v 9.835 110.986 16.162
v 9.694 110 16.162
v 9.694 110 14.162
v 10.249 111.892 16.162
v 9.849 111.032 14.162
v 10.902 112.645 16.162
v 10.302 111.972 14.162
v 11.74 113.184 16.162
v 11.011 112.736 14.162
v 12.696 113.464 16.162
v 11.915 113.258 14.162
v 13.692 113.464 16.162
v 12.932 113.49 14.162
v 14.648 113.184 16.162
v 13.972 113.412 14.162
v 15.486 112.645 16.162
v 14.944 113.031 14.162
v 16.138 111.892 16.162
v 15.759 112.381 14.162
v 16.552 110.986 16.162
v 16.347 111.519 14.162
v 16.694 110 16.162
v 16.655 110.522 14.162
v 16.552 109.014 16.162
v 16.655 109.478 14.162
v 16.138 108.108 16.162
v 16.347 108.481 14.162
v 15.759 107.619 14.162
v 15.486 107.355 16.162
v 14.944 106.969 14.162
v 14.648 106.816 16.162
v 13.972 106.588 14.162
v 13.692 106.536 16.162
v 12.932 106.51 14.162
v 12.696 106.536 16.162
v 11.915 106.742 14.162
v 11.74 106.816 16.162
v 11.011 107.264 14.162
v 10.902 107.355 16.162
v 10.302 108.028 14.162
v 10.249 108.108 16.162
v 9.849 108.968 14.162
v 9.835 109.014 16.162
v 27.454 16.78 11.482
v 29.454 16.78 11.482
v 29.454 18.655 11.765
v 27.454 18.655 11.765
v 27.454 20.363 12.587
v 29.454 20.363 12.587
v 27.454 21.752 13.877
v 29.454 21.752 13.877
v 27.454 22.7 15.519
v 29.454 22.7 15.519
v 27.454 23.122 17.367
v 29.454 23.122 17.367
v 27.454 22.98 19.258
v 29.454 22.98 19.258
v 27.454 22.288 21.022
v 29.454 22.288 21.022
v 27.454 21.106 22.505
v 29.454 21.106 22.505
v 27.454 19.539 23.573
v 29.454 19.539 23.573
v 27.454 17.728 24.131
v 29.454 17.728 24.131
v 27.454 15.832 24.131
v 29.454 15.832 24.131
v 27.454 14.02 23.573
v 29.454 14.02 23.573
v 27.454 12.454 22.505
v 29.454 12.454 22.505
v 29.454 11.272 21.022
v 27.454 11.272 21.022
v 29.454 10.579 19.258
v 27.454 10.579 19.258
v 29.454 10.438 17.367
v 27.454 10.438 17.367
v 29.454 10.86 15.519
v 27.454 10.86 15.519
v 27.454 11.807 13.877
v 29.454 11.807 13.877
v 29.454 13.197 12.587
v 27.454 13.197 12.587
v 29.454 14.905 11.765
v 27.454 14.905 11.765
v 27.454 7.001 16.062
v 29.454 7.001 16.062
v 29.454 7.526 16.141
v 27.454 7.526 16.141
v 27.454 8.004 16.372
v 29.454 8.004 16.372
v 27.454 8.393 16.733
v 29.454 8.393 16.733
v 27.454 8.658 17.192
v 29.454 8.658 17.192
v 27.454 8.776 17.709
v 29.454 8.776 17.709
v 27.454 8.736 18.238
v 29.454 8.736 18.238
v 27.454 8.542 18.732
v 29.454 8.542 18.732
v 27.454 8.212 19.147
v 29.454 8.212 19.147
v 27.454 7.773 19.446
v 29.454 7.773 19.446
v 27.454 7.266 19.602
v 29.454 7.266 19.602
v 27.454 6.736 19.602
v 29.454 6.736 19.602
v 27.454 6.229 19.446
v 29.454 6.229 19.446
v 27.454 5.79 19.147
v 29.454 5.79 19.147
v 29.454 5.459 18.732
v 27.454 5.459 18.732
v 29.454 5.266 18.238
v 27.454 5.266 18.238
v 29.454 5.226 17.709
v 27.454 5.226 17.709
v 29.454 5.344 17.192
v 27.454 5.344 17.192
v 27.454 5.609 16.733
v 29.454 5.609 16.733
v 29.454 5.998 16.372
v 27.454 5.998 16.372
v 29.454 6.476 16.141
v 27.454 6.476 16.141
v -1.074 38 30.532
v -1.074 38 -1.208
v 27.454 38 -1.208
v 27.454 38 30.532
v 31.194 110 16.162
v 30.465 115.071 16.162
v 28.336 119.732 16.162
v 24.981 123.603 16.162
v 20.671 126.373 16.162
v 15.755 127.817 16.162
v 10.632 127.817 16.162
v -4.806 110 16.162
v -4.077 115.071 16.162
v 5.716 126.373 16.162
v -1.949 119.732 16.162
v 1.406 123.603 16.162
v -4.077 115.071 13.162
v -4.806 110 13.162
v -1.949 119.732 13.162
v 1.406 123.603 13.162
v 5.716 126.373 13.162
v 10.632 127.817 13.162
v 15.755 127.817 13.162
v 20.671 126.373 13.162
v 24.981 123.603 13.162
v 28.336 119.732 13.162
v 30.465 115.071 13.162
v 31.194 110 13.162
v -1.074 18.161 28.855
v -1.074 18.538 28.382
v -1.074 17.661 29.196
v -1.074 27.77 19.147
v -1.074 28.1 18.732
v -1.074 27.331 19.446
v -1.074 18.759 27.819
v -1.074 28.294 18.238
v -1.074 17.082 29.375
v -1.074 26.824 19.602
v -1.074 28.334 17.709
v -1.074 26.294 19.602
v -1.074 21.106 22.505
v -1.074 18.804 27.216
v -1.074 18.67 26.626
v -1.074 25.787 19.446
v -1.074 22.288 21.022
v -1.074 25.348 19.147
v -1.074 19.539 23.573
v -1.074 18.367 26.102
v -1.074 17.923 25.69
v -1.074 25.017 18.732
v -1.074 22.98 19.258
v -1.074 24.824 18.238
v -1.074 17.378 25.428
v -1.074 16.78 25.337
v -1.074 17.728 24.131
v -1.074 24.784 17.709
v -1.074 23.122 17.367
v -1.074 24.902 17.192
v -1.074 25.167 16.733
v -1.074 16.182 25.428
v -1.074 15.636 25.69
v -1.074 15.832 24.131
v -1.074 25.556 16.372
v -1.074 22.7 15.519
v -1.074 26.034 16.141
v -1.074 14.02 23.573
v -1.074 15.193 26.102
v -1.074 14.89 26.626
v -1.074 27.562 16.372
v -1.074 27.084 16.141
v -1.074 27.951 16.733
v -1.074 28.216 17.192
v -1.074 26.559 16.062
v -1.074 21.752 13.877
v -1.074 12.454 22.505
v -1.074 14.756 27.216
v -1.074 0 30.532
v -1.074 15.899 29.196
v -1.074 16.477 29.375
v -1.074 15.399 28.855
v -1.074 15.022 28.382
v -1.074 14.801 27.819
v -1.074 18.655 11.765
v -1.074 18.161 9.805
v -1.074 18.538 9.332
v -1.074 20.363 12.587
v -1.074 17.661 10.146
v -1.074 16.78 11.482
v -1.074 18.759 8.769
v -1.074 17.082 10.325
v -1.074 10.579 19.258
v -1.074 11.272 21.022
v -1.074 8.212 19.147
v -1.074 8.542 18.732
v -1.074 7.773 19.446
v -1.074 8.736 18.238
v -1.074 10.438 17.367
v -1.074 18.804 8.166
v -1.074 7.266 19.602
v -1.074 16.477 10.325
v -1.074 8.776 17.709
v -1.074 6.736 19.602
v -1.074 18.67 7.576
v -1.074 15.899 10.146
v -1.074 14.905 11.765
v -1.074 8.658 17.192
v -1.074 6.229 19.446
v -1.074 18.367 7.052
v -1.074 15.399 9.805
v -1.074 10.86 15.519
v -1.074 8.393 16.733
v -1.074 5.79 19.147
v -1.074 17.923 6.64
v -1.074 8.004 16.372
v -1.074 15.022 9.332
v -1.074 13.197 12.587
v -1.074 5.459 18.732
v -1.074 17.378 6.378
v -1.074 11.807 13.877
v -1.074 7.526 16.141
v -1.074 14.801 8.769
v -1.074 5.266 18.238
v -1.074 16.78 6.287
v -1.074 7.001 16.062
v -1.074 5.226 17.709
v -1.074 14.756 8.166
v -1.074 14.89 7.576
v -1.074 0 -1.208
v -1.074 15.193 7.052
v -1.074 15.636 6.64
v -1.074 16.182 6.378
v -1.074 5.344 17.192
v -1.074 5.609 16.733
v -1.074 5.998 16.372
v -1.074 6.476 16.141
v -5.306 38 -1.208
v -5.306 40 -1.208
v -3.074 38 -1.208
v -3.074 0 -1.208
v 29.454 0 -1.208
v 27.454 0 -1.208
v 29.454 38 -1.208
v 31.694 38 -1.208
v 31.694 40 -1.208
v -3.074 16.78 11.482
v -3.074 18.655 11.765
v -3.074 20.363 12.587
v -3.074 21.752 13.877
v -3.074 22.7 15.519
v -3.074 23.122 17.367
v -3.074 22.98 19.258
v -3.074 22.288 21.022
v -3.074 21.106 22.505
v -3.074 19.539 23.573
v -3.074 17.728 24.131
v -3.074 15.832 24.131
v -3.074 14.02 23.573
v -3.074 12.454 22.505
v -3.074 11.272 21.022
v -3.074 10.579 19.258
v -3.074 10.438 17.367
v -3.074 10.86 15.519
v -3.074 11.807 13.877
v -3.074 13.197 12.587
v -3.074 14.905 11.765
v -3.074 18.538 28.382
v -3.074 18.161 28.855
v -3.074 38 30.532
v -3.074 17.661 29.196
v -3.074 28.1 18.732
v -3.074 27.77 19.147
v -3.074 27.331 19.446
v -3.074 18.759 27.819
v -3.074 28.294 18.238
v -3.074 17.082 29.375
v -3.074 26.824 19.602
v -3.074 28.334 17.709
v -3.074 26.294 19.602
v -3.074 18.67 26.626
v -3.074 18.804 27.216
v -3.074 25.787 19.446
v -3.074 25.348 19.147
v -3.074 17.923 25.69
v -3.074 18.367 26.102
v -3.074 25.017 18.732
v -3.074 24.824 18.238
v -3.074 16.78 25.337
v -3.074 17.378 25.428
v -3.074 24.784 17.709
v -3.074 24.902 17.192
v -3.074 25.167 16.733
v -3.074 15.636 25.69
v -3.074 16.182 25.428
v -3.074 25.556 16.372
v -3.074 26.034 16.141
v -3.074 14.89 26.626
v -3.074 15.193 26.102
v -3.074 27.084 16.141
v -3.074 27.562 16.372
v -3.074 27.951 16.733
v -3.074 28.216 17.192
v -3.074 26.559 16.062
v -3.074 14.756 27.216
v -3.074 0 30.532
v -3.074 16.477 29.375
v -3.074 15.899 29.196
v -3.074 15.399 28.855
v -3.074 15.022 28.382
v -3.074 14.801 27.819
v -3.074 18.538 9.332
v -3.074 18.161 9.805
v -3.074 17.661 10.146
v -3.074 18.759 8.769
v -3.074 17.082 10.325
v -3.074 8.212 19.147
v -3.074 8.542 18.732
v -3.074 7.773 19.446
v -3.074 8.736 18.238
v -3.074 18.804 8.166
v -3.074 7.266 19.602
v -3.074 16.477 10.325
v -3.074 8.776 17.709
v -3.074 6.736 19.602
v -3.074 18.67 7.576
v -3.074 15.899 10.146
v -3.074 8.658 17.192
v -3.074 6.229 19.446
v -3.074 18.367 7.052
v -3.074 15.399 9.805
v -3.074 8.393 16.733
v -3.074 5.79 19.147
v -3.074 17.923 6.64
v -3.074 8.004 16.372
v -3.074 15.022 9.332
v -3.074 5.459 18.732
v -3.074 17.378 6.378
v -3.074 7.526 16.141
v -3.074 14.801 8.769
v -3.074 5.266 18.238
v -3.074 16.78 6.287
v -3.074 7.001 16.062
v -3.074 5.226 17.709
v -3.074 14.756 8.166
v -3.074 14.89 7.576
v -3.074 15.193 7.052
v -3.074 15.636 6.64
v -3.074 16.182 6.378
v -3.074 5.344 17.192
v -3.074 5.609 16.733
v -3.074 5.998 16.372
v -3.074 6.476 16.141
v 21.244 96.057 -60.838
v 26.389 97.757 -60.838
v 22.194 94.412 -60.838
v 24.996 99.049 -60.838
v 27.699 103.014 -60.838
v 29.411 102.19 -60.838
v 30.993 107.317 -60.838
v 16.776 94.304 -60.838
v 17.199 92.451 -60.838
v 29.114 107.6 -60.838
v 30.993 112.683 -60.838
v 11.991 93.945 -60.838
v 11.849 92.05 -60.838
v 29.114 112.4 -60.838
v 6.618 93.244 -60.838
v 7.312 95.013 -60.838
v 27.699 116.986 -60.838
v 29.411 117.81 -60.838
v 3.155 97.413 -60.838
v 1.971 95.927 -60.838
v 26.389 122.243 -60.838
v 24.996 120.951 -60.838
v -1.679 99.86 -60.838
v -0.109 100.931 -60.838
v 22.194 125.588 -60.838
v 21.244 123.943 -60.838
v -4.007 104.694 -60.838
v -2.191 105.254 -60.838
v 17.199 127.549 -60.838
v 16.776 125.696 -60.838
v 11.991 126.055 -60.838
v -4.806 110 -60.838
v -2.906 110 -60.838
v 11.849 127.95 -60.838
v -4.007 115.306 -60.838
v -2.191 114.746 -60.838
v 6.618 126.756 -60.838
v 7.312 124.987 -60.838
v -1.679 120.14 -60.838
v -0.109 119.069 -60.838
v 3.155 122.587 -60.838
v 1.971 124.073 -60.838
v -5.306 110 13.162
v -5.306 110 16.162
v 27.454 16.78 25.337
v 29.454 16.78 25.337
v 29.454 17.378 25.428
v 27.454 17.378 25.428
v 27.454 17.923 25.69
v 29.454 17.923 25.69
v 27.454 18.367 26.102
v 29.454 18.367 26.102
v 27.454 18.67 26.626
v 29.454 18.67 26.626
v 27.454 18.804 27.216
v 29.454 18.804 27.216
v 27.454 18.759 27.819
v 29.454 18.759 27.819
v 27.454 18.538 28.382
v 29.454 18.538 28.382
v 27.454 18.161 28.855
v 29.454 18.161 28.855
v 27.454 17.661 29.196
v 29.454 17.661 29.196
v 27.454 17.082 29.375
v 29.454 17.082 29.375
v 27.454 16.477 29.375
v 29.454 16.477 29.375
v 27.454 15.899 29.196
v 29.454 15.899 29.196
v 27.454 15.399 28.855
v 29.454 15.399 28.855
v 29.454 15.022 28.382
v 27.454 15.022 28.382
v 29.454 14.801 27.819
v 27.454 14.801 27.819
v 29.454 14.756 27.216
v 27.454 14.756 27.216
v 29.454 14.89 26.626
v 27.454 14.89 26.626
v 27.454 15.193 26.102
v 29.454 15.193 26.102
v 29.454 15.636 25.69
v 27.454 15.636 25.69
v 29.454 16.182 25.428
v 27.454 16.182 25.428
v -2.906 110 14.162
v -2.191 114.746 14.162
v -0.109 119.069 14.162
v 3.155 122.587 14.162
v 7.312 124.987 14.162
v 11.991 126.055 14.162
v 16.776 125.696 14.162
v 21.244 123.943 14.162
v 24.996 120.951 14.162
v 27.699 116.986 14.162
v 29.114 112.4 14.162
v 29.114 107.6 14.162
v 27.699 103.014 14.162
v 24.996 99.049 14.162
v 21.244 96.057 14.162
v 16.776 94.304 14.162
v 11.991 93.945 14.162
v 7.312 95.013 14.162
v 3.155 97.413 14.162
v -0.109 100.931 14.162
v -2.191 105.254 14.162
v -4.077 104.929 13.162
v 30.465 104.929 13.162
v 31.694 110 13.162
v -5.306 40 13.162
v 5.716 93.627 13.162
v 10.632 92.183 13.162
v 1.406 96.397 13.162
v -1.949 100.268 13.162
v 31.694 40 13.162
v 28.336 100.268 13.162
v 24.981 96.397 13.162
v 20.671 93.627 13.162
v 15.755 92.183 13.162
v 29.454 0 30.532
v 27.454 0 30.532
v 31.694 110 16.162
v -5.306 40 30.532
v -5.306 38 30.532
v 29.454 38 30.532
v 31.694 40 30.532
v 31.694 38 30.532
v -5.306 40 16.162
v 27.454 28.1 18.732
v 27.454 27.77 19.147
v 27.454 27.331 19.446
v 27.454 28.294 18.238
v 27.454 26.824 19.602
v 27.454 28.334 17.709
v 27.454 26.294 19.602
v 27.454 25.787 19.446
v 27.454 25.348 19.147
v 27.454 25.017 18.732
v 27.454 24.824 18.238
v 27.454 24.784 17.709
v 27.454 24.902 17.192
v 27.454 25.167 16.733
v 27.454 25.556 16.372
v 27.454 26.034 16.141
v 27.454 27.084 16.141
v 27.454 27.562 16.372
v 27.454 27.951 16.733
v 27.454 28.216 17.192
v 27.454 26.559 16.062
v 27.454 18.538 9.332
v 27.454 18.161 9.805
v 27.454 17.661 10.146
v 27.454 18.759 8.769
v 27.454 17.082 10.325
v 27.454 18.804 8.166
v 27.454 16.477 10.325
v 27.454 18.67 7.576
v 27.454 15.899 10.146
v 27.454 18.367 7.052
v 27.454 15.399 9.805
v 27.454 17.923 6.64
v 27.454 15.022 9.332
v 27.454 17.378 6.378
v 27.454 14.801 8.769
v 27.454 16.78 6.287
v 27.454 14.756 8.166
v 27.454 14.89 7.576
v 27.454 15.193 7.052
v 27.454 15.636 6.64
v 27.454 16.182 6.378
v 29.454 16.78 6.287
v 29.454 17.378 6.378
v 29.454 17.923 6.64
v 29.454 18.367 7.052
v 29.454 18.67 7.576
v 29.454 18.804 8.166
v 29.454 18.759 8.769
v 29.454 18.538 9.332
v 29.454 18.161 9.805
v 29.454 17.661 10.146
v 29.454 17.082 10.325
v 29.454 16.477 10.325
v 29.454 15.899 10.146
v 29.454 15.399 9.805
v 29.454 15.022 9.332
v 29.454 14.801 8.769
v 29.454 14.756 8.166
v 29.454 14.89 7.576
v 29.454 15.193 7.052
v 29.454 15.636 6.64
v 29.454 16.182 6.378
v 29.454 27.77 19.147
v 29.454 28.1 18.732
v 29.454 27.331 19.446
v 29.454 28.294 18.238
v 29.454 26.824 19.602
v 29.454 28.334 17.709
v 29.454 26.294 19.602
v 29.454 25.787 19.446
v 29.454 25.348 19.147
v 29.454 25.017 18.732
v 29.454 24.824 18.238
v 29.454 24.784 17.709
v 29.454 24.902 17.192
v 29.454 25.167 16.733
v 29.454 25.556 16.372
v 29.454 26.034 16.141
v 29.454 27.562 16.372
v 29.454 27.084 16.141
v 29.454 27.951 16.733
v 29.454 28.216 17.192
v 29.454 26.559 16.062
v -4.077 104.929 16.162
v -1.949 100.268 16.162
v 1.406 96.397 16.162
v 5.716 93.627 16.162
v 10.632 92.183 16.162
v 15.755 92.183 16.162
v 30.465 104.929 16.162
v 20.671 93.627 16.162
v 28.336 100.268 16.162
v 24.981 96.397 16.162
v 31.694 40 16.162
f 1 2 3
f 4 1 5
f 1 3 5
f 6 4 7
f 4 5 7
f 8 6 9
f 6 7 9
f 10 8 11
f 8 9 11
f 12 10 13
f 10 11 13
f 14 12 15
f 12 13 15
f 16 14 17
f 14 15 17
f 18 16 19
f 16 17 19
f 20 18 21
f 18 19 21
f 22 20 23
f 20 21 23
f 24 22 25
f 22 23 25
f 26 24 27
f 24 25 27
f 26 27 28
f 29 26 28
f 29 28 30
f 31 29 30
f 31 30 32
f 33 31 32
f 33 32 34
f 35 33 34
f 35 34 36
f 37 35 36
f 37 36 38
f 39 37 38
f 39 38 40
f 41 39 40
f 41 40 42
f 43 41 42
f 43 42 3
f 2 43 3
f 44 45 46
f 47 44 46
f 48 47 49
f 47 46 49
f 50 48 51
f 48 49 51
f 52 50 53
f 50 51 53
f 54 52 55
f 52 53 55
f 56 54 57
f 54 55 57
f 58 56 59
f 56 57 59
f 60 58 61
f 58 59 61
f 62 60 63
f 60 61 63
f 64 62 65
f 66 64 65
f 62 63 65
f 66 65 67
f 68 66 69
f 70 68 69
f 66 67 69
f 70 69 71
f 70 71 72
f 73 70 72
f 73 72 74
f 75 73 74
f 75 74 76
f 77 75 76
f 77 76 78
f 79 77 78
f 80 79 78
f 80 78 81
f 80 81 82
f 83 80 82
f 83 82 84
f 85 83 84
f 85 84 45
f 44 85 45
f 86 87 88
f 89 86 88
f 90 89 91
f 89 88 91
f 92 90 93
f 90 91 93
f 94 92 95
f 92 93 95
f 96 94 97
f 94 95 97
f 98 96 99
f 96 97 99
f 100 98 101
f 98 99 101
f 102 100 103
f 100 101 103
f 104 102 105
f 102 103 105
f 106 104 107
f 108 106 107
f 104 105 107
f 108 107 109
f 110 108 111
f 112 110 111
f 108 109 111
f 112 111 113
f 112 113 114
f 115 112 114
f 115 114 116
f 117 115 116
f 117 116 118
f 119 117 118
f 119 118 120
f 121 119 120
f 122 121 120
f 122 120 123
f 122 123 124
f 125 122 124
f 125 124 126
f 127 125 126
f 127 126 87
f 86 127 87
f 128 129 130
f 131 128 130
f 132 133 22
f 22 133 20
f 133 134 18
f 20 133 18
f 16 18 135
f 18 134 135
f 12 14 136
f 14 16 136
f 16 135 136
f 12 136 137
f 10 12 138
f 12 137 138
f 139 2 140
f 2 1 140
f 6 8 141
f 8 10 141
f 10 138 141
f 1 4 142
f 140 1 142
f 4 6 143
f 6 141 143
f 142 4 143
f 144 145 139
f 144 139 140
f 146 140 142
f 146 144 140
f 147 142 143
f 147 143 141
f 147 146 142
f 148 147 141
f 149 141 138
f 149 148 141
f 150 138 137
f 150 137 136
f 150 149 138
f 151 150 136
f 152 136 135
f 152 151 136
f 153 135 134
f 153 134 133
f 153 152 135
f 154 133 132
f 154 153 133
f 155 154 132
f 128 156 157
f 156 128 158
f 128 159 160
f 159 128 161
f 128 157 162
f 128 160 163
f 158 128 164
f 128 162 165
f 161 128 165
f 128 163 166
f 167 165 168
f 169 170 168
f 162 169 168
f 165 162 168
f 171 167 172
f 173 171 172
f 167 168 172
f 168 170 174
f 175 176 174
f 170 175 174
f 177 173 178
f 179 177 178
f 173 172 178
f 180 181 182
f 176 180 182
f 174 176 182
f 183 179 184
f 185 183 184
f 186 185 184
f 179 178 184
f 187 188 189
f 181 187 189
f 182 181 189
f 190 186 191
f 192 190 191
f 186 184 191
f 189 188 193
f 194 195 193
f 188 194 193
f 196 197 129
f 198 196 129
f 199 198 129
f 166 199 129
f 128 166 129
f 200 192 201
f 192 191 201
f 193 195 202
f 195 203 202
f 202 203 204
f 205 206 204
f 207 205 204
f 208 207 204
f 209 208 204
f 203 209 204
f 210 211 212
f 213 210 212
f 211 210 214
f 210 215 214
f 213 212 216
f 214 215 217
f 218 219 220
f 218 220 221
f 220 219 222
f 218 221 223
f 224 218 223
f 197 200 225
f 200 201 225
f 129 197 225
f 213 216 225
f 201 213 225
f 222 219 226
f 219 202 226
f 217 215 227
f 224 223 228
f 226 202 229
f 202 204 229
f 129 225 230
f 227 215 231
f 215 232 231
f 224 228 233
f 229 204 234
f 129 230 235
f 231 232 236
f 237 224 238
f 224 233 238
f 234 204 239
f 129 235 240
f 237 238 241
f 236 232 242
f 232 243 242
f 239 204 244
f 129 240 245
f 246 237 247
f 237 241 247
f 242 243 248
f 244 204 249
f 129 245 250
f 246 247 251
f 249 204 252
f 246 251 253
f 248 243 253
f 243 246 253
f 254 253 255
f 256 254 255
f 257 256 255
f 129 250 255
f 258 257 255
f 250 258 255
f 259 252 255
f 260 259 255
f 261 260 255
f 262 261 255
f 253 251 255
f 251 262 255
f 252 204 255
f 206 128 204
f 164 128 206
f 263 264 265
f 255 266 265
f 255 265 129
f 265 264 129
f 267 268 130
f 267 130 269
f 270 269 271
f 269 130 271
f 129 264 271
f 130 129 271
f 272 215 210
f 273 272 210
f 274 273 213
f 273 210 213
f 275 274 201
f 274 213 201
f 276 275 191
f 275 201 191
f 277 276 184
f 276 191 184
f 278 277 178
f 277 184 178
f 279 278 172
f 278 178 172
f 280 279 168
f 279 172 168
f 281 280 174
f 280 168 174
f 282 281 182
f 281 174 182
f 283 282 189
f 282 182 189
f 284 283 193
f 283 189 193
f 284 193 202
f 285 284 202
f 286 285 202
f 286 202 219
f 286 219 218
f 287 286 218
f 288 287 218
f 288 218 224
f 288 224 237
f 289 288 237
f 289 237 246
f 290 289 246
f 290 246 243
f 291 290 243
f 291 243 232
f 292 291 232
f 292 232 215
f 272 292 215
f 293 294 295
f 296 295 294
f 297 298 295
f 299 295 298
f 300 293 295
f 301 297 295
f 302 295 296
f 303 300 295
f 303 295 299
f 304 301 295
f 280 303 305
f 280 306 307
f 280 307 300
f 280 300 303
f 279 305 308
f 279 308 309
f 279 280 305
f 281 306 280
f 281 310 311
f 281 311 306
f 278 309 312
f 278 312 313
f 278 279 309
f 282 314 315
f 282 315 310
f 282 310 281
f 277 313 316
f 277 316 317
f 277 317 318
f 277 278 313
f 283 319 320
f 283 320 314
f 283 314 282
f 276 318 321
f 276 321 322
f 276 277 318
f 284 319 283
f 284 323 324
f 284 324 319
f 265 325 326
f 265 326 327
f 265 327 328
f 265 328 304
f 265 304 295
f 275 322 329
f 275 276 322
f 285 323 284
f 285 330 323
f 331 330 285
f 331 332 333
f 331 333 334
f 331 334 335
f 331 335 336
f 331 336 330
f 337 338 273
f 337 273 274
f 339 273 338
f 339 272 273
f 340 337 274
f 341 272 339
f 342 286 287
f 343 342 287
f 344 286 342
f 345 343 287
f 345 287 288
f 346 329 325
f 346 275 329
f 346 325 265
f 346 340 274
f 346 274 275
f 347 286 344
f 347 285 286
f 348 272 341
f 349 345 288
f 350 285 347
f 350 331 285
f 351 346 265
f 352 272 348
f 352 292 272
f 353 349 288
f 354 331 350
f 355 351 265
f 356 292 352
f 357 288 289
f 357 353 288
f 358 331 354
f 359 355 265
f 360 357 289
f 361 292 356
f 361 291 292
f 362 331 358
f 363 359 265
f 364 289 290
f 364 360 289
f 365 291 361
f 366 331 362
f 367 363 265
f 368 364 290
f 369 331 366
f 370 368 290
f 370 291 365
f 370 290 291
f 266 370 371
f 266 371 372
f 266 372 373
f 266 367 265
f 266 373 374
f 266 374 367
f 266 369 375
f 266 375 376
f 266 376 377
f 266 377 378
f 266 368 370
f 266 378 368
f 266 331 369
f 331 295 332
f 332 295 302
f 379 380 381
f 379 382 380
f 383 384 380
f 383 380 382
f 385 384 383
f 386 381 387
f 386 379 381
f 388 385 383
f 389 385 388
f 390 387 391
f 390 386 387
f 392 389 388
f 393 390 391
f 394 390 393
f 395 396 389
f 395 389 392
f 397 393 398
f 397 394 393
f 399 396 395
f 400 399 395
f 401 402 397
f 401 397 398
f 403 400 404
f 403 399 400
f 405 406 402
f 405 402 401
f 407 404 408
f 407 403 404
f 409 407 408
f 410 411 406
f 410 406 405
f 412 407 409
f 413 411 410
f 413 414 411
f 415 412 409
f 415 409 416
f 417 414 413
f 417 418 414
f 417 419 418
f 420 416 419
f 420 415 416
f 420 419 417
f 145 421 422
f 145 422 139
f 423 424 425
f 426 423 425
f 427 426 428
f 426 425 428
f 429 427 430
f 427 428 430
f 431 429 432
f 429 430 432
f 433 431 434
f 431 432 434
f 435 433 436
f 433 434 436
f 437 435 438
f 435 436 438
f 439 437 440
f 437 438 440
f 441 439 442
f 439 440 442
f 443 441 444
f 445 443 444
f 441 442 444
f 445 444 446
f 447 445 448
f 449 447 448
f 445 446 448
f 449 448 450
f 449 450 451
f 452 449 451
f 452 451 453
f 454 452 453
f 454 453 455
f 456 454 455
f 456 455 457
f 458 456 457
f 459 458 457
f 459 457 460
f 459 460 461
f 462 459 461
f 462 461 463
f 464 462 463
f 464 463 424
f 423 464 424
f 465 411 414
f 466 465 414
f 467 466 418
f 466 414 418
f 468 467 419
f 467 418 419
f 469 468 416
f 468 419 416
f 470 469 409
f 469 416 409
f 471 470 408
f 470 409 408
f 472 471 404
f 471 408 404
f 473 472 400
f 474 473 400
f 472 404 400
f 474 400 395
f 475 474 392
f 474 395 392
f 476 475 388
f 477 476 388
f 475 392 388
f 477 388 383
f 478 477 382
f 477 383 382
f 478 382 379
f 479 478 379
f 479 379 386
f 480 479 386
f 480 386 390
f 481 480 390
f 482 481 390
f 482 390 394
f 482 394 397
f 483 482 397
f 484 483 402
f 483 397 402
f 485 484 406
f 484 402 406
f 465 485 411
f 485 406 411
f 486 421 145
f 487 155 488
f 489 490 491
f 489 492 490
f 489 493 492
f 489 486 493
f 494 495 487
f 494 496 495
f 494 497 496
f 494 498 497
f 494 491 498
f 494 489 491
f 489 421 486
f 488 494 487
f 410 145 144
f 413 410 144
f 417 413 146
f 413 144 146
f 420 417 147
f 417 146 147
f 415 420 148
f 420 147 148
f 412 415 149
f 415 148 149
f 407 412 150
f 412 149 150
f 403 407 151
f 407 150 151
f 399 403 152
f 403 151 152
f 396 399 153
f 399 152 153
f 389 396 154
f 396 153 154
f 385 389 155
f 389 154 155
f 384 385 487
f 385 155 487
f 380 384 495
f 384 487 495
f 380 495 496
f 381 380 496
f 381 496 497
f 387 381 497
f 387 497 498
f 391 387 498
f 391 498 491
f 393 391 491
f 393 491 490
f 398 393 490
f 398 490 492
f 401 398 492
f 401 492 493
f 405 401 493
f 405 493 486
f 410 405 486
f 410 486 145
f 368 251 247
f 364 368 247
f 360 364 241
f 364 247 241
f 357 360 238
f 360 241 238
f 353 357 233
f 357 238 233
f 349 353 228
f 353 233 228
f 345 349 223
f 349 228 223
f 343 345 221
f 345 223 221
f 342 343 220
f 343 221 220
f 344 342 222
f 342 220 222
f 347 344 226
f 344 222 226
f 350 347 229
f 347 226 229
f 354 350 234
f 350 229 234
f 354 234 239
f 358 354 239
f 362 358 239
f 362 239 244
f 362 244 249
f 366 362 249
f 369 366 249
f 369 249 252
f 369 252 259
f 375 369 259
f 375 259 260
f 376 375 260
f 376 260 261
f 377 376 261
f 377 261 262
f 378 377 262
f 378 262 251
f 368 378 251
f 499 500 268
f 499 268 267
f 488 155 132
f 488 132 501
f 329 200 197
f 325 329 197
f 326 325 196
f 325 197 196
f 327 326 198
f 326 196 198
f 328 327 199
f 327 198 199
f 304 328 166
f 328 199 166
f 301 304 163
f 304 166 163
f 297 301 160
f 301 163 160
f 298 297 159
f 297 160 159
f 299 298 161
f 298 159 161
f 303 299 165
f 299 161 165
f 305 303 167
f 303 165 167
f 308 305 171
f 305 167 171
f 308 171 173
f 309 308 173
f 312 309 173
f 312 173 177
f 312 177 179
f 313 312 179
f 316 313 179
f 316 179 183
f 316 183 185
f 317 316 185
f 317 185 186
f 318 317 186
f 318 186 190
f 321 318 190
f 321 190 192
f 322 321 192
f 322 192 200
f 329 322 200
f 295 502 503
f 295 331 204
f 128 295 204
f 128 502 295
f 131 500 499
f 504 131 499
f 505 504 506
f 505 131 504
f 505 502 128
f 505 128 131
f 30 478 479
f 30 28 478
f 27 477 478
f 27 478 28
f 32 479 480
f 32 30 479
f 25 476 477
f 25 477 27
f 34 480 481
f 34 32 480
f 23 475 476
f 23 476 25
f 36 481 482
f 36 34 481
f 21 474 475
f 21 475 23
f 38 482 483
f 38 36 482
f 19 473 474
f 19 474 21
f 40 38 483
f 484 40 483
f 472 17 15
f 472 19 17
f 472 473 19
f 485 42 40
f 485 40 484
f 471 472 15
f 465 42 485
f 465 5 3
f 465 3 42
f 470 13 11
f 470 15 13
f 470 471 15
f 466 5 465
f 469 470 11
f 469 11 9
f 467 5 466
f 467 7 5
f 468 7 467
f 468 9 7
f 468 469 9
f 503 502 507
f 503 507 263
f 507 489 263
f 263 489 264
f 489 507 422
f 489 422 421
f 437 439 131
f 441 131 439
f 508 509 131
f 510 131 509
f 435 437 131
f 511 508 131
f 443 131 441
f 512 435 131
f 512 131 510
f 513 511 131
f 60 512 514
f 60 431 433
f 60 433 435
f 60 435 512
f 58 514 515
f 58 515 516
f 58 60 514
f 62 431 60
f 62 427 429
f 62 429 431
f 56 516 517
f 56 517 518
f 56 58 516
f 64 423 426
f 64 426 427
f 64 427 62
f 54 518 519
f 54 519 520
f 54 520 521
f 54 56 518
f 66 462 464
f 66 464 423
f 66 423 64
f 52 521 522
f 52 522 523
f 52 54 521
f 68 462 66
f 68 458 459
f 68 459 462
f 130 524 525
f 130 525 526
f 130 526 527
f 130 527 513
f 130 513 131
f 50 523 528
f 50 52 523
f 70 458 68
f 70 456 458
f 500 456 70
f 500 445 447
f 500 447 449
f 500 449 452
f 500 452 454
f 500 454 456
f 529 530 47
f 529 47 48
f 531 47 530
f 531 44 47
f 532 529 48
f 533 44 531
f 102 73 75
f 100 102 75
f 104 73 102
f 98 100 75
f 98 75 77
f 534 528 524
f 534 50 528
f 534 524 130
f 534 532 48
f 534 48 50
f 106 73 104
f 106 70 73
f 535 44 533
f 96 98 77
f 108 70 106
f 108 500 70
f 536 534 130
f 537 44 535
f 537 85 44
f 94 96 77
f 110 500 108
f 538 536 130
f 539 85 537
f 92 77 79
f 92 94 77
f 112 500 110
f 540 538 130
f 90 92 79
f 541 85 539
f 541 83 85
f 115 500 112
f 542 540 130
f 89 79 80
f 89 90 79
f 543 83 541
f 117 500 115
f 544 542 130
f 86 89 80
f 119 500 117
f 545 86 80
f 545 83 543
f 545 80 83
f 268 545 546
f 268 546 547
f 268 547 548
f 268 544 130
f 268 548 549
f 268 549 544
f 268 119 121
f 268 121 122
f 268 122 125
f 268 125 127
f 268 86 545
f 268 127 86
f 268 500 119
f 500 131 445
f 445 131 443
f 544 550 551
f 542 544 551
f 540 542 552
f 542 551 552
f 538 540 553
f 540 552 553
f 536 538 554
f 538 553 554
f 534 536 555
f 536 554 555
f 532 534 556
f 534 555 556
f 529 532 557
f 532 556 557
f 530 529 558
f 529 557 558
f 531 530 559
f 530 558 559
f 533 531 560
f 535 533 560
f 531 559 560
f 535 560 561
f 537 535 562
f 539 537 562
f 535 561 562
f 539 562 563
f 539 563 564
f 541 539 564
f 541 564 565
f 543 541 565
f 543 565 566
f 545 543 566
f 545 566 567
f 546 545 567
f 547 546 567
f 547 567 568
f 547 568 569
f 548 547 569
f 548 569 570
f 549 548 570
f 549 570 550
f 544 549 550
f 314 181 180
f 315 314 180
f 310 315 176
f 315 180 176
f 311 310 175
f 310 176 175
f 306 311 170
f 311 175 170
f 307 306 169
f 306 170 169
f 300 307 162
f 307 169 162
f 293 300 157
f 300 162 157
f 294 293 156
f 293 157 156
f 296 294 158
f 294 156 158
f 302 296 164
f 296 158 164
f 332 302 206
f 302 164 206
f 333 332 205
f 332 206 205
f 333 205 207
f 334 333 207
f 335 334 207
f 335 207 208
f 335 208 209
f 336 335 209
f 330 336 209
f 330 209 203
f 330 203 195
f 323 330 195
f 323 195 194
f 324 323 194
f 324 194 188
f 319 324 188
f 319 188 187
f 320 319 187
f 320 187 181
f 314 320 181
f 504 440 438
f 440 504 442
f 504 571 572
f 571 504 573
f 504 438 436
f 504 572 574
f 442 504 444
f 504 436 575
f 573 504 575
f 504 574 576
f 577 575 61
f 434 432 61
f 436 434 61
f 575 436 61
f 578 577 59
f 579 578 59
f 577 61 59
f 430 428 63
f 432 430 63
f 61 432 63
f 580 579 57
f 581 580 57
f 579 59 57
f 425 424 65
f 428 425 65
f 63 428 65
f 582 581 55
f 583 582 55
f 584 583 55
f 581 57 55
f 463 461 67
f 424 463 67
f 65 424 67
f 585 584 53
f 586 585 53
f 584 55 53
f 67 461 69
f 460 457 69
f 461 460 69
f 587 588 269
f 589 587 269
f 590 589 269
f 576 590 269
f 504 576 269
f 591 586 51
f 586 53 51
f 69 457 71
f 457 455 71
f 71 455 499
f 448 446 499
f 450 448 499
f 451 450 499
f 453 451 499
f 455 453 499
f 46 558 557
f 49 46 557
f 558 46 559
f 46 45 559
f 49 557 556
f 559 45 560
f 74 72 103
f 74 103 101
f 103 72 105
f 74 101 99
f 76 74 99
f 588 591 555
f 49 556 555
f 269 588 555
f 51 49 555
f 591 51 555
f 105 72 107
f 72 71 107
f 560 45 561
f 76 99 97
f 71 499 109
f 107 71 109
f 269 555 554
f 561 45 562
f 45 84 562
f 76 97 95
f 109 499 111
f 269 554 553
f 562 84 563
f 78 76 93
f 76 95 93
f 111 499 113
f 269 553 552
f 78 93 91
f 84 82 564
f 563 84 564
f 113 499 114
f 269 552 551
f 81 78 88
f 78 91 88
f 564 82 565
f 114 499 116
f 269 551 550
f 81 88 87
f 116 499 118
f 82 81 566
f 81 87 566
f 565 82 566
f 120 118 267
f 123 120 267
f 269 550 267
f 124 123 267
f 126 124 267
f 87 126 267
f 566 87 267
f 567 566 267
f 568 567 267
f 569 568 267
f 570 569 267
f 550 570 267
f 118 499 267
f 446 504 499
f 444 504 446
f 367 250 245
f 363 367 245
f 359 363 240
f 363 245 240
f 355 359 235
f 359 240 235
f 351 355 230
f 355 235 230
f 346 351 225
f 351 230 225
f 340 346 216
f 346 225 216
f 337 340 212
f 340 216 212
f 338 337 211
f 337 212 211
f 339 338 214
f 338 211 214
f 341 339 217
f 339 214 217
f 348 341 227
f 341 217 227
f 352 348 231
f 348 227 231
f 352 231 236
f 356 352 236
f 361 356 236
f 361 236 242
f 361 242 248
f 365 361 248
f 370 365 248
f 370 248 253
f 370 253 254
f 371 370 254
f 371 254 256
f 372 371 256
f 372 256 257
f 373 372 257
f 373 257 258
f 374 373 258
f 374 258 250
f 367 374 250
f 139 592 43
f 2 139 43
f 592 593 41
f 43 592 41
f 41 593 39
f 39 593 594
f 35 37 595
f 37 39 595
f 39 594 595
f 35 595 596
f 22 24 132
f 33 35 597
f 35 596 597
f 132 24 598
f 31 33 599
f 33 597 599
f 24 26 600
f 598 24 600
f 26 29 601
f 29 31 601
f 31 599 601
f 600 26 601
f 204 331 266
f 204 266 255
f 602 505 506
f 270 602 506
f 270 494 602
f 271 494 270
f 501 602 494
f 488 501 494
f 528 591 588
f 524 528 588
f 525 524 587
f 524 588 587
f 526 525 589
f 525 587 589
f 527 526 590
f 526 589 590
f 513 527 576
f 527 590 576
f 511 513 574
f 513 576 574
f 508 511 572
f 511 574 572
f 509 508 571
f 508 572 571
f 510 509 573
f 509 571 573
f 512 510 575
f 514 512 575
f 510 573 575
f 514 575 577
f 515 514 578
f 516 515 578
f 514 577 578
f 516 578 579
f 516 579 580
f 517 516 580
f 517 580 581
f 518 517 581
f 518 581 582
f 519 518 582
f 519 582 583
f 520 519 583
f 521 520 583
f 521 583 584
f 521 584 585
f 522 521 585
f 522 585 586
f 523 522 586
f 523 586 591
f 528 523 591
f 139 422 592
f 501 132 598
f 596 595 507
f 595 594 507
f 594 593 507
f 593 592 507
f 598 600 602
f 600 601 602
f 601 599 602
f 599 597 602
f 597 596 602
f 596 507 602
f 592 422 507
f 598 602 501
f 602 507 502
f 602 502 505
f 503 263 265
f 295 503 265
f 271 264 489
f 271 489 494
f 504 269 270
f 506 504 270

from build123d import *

# Parameters (mm, degrees)
SKETCH1_W                = 2
SKETCH1_H                = 31.74
BOSS_EXTRUDE1_DEPTH      = 40
BOSS_EXTRUDE1_2_DEPTH    = 40
SKETCH2_W                = 37
SKETCH2_H                = 31.74
BOSS_EXTRUDE3_DEPTH      = 2
SKETCH8_W                = 37
SKETCH8_H                = 3
BOSS_EXTRUDE4_DEPTH      = 70
SKETCH12_R               = 18
BOSS_EXTRUDE6_DEPTH      = 74
BOSS_EXTRUDE6_DEPTH_BACK = 3
SKETCH18_R               = 16.1
CUT_EXTRUDE2_DEPTH       = 75
SKETCH19_R               = 3.5
CUT_EXTRUDE3_DEPTH       = 74
SKETCH20_R               = 6.36
SKETCH20_R_2             = 1.78
SKETCH20_R_3             = 2.03
CUT_EXTRUDE4_DEPTH       = 3.24
CUT_EXTRUDE4_DEPTH_BACK  = 35.76


with BuildPart() as part:
    # Sketch1 → Boss-Extrude1 (new body)
    with BuildSketch(Plane(origin=(0, 0, 0), x_dir=(1, 0, 0), z_dir=(0, 1, 0))):
        with Locations((-2.074327578, -14.662349727)):
            Rectangle(SKETCH1_W, SKETCH1_H)
    extrude(amount=BOSS_EXTRUDE1_DEPTH)



with BuildPart() as body_2:
    # Sketch1 → Boss-Extrude1 2 (new body)
    with BuildSketch(Plane(origin=(0, 0, 0), x_dir=(1, 0, 0), z_dir=(0, 1, 0))):
        with Locations((28.453672422, -14.662349727)):
            Rectangle(SKETCH1_W, SKETCH1_H)
    extrude(amount=BOSS_EXTRUDE1_2_DEPTH)


with BuildPart() as part_1:
    add(part.part)

    add(body_2.part)  # Boss-Extrude3 merges body 2
    # Sketch2 → Boss-Extrude3 (add)
    with BuildSketch(Plane(origin=(0, 40, 0), x_dir=(1, 0, 0), z_dir=(0, 1, 0))):
        with Locations((13.193672422, -14.662349727)):
            Rectangle(SKETCH2_W, SKETCH2_H)
    extrude(amount=-BOSS_EXTRUDE3_DEPTH)

    # Sketch8 → Boss-Extrude4 (add)
    with BuildSketch(Plane(origin=(0, 40, 0), x_dir=(1, 0, 0), z_dir=(0, 1, 0))):
        with Locations((13.193672422, -14.662349727)):
            Rectangle(SKETCH8_W, SKETCH8_H)
    extrude(amount=BOSS_EXTRUDE4_DEPTH)

    # Sketch12 → Boss-Extrude6 (add, two sides)
    with BuildSketch(Plane(origin=(0, 0, 13.162349727), x_dir=(-1, 0, 0), z_dir=(0, 0, -1))) as boss_extrude6_sk:
        with Locations((-13.193672422, 110)):
            Circle(SKETCH12_R)
    extrude(amount=BOSS_EXTRUDE6_DEPTH)
    extrude(boss_extrude6_sk.sketch, amount=-BOSS_EXTRUDE6_DEPTH_BACK)

    # Sketch18 → Cut-Extrude2 (cut)
    with BuildSketch(Plane(origin=(0, 0, -60.837650273), x_dir=(-1, 0, 0), z_dir=(0, 0, -1))):
        with Locations((-13.193672422, 110)):
            Circle(SKETCH18_R)
    extrude(amount=-CUT_EXTRUDE2_DEPTH, mode=Mode.SUBTRACT)

    # Sketch19 → Cut-Extrude3 (cut)
    with BuildSketch(Plane(origin=(0, 0, 14.162349727), x_dir=(-1, 0, 0), z_dir=(0, 0, -1))):
        with Locations((-13.193672422, 110)):
            Circle(SKETCH19_R)
    extrude(amount=-CUT_EXTRUDE3_DEPTH, mode=Mode.SUBTRACT)

    # Sketch20 → Cut-Extrude4 (cut, two sides)
    with BuildSketch(Plane(origin=(29.453672422, 0, 0), x_dir=(0, 0, -1), z_dir=(1, 0, 0))) as cut_extrude4_sk:
        with Locations((-17.842349727, 16.779878139)):
            Circle(SKETCH20_R)
        with Locations((-17.842349727, 26.558878139)):
            Circle(SKETCH20_R_2)
        with Locations((-17.842349727, 7.000878139)):
            Circle(SKETCH20_R_2)
        with Locations((-27.367349727, 16.779878139)):
            Circle(SKETCH20_R_3)
        with Locations((-8.317349727, 16.779878139)):
            Circle(SKETCH20_R_3)
    extrude(amount=CUT_EXTRUDE4_DEPTH, mode=Mode.SUBTRACT)
    extrude(cut_extrude4_sk.sketch, amount=-CUT_EXTRUDE4_DEPTH_BACK, mode=Mode.SUBTRACT)


solid = part_1.part
